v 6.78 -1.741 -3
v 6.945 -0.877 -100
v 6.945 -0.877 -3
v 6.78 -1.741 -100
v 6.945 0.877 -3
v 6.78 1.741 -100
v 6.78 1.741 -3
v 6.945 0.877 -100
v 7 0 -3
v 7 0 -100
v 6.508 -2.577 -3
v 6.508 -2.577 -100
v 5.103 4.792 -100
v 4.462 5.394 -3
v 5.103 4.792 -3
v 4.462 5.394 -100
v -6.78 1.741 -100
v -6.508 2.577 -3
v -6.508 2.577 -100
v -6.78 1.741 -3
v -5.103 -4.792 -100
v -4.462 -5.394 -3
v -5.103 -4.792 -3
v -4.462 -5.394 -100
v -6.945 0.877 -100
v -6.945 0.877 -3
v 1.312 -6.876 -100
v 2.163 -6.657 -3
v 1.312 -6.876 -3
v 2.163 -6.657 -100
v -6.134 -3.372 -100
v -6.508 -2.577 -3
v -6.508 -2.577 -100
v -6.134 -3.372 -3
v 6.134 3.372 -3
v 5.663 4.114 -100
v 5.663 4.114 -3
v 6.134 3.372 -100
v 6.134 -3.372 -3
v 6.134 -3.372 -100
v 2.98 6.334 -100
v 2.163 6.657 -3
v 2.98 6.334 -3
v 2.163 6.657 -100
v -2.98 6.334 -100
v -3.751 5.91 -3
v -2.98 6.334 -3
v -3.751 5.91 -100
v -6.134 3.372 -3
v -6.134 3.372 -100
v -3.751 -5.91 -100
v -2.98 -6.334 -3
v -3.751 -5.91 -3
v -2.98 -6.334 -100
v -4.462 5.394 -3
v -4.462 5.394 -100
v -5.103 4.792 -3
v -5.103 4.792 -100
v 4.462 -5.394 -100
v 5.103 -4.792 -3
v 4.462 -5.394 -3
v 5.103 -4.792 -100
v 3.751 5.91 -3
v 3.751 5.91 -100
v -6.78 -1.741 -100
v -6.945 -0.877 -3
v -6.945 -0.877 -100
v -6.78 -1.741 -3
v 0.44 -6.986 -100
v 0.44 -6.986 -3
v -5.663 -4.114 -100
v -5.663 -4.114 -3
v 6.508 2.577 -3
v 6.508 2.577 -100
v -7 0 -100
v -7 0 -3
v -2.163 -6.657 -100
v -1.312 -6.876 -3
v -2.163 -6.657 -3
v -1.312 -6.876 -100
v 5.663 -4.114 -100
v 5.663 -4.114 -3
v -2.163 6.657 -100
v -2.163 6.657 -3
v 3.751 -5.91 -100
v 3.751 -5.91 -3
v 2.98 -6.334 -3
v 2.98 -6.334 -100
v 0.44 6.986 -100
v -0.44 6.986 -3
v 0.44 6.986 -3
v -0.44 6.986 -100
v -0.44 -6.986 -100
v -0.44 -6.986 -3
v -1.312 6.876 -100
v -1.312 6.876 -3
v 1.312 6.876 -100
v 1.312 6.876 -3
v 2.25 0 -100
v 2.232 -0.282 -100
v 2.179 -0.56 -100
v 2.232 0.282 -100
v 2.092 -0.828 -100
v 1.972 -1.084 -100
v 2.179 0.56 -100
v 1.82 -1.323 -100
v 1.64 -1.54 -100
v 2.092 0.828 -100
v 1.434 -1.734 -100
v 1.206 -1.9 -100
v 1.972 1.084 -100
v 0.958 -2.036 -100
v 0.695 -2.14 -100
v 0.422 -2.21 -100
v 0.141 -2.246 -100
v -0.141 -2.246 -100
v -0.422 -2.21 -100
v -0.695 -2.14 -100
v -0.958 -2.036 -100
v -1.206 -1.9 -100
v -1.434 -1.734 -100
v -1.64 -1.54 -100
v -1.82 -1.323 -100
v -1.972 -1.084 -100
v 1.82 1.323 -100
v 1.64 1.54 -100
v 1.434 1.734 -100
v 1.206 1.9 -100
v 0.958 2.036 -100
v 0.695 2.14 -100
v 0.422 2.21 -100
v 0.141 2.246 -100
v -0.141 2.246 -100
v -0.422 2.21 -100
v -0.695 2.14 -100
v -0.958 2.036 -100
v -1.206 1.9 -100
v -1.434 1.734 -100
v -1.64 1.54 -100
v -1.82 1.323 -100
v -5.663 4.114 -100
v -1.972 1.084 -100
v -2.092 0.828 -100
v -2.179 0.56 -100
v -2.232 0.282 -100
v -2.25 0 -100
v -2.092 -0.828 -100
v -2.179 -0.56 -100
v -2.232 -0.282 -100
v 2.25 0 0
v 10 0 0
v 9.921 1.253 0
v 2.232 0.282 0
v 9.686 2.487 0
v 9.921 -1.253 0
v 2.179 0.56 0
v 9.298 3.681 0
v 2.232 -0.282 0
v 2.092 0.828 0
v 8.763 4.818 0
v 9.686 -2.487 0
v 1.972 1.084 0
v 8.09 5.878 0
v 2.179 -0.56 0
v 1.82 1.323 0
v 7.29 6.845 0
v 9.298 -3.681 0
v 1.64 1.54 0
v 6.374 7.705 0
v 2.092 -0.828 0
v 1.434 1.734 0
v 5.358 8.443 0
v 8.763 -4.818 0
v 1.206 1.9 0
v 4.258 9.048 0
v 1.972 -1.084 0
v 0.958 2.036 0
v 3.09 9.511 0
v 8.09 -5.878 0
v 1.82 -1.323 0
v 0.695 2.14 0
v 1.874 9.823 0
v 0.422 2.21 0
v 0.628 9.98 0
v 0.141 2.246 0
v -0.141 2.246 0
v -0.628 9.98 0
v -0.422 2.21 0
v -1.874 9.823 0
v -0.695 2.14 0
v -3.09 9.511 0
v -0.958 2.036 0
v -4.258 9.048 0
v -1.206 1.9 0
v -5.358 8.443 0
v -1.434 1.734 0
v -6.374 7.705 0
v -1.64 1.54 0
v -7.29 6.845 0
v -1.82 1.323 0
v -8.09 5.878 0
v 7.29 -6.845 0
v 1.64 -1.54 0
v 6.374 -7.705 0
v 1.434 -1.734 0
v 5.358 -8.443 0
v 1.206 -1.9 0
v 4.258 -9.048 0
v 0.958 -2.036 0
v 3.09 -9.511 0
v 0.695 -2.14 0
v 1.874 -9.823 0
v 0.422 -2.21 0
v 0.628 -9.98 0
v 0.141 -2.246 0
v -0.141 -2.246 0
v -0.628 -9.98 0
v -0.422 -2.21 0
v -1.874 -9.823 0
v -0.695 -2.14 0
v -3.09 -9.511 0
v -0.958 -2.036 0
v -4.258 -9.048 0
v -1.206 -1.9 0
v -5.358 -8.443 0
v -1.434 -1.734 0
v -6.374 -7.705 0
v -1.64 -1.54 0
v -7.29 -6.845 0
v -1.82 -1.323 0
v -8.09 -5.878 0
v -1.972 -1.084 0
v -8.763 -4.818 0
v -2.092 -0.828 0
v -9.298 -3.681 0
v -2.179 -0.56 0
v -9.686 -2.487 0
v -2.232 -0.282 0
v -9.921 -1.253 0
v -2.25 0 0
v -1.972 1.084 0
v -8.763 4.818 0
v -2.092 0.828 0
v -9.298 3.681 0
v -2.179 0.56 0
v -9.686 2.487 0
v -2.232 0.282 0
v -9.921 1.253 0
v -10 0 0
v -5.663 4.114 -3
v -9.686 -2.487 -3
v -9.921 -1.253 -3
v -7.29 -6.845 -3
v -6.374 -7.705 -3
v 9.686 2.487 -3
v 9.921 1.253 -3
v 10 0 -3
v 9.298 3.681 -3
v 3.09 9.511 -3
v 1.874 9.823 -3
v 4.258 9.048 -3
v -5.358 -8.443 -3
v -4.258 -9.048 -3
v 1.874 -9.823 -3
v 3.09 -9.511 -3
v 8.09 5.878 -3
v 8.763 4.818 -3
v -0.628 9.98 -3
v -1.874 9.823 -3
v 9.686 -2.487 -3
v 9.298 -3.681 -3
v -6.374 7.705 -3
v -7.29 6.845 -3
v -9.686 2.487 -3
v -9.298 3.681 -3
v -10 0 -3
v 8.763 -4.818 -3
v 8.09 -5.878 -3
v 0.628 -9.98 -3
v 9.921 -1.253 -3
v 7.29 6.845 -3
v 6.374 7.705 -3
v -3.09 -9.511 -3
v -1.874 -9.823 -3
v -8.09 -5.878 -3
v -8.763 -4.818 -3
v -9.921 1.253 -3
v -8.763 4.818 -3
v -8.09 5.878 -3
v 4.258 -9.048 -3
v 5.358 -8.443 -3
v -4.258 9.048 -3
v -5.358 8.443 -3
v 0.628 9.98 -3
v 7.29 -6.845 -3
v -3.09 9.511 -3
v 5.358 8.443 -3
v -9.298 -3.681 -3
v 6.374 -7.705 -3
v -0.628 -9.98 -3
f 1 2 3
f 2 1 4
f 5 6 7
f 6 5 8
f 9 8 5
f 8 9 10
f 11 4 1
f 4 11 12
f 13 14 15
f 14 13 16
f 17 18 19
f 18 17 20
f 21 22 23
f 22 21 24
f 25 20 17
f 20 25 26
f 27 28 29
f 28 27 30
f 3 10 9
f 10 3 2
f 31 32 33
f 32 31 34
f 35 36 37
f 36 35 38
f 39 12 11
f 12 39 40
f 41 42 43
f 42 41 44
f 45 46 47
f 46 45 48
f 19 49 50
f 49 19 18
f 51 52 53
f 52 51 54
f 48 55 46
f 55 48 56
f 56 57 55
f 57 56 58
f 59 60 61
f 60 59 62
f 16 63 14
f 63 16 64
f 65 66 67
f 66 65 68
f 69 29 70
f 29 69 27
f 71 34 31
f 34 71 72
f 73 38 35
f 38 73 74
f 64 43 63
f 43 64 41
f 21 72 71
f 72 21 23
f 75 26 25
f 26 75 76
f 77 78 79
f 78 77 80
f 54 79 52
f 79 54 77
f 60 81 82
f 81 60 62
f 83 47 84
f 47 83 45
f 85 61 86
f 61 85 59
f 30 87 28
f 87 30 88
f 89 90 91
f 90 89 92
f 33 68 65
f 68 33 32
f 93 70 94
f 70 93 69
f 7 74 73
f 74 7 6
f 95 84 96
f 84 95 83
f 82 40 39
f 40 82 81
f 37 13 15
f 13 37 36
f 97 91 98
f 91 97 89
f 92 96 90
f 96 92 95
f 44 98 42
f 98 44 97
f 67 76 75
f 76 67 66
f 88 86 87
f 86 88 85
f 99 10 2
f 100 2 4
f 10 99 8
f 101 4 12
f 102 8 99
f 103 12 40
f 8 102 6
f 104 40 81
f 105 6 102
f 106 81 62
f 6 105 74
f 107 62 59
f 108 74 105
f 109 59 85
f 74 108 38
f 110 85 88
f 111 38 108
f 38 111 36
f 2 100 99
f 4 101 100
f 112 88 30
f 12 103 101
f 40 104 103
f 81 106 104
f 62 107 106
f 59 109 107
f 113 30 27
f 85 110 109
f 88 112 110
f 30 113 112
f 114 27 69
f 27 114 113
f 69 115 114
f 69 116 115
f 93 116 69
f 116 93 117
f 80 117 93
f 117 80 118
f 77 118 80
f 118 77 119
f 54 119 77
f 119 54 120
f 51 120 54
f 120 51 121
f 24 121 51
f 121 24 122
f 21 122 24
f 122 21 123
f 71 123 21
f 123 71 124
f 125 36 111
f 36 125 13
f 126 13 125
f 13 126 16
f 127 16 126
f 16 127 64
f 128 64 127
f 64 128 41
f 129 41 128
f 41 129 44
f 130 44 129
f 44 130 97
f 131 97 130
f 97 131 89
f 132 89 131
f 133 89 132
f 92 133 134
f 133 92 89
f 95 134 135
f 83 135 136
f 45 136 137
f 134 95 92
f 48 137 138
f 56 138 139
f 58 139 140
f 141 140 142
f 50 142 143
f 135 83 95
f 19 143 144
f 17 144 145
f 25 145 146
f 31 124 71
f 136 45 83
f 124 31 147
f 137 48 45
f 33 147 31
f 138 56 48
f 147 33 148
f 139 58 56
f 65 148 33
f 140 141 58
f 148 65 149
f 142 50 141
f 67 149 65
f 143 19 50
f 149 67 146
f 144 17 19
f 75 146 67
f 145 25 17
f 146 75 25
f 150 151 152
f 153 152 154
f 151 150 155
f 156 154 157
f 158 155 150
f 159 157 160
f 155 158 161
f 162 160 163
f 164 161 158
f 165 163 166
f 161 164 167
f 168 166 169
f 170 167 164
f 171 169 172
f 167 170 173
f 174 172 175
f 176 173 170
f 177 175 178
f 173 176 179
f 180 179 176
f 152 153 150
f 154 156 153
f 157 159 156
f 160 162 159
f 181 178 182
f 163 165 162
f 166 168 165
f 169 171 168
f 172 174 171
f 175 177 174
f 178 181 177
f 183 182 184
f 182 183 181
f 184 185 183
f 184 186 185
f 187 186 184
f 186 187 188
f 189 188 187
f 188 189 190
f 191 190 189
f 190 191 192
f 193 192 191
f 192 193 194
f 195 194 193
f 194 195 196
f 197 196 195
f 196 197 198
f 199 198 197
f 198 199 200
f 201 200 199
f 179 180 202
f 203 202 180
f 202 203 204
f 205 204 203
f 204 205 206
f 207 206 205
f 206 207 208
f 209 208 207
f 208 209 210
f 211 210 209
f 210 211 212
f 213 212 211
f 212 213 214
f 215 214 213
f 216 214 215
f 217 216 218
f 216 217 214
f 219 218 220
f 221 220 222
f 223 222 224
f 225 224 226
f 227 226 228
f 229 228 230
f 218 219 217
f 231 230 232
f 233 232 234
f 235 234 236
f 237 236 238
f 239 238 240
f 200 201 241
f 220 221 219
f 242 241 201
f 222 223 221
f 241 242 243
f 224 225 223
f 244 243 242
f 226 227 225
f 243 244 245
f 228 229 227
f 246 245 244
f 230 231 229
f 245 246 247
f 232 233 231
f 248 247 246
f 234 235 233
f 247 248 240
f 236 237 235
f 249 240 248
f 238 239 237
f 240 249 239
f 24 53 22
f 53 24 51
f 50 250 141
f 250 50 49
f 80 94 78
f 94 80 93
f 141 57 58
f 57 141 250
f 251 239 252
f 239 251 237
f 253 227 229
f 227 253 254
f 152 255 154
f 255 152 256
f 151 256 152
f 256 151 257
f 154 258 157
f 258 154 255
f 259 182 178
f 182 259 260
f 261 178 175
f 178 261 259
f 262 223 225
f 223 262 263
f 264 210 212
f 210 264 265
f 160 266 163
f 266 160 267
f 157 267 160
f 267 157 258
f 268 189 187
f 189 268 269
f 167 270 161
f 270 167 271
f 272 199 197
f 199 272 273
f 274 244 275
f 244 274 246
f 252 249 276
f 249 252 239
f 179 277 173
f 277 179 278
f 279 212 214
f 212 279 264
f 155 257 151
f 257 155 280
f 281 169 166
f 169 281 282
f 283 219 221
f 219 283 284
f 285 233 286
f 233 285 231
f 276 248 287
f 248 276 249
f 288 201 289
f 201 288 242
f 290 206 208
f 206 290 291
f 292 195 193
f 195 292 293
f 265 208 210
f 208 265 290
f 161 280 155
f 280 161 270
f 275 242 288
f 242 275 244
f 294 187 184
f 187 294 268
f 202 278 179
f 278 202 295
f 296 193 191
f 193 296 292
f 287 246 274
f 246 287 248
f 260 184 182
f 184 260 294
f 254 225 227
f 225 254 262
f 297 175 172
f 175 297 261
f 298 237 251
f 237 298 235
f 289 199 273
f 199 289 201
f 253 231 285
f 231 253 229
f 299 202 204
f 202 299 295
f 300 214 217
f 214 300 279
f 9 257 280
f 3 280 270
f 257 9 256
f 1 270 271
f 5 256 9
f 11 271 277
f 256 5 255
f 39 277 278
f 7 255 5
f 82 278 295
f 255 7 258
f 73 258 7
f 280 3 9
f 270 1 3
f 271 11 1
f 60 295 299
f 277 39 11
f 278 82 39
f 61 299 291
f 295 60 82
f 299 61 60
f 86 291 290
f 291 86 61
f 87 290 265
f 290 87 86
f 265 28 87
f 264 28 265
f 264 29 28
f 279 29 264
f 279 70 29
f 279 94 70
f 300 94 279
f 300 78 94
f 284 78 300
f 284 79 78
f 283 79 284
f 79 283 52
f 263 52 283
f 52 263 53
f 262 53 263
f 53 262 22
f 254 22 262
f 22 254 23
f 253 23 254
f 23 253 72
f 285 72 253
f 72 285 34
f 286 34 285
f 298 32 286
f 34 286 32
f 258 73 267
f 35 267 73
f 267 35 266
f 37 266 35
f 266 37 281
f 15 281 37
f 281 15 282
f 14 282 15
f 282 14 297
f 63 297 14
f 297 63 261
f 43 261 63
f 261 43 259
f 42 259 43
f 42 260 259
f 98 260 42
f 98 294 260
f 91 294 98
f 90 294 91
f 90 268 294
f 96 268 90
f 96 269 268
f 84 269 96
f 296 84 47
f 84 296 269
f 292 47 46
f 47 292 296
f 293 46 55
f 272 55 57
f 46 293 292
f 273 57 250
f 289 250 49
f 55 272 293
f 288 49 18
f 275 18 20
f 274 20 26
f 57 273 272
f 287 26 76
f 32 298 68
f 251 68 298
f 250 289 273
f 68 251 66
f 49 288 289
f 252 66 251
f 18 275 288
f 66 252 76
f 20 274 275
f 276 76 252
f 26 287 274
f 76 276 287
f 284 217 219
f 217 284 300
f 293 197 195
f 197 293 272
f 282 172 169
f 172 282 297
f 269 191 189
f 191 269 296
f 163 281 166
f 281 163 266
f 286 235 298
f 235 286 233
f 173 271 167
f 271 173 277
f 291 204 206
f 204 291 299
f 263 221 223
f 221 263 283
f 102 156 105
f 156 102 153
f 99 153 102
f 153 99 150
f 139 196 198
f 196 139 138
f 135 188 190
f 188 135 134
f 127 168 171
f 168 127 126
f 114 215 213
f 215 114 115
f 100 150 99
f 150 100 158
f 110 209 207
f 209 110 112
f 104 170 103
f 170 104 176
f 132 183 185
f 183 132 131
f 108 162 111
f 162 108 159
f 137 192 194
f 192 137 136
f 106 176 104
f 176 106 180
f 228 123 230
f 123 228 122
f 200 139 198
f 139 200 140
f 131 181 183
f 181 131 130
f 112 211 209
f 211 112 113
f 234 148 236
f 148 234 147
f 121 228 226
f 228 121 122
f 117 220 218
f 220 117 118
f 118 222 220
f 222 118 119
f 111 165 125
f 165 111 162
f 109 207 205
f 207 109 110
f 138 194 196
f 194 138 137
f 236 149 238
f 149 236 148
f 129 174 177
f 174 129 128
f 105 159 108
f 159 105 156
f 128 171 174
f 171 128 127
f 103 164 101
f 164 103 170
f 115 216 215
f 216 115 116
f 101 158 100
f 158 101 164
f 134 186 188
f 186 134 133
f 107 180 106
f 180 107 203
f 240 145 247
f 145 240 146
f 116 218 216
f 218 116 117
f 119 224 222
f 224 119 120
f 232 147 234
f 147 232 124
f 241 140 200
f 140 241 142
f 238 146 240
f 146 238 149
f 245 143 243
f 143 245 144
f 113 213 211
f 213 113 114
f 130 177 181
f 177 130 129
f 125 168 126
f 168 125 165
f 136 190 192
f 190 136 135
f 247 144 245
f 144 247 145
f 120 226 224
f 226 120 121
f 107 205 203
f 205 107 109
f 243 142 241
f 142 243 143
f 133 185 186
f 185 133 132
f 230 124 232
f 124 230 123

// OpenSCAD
$fn = 50;


difference() {
	union() {
		translate(v = [0, 0, -100.0000000000]) {
			cylinder(h = 100, r = 7.0000000000);
		}
		translate(v = [0, 0, -3.0000000000]) {
			cylinder(h = 3, r = 10.0000000000);
		}
	}
	union() {
		#translate(v = [0, 0, -100]) {
			cylinder(h = 100, r = 2.2500000000);
		}
	}
}
